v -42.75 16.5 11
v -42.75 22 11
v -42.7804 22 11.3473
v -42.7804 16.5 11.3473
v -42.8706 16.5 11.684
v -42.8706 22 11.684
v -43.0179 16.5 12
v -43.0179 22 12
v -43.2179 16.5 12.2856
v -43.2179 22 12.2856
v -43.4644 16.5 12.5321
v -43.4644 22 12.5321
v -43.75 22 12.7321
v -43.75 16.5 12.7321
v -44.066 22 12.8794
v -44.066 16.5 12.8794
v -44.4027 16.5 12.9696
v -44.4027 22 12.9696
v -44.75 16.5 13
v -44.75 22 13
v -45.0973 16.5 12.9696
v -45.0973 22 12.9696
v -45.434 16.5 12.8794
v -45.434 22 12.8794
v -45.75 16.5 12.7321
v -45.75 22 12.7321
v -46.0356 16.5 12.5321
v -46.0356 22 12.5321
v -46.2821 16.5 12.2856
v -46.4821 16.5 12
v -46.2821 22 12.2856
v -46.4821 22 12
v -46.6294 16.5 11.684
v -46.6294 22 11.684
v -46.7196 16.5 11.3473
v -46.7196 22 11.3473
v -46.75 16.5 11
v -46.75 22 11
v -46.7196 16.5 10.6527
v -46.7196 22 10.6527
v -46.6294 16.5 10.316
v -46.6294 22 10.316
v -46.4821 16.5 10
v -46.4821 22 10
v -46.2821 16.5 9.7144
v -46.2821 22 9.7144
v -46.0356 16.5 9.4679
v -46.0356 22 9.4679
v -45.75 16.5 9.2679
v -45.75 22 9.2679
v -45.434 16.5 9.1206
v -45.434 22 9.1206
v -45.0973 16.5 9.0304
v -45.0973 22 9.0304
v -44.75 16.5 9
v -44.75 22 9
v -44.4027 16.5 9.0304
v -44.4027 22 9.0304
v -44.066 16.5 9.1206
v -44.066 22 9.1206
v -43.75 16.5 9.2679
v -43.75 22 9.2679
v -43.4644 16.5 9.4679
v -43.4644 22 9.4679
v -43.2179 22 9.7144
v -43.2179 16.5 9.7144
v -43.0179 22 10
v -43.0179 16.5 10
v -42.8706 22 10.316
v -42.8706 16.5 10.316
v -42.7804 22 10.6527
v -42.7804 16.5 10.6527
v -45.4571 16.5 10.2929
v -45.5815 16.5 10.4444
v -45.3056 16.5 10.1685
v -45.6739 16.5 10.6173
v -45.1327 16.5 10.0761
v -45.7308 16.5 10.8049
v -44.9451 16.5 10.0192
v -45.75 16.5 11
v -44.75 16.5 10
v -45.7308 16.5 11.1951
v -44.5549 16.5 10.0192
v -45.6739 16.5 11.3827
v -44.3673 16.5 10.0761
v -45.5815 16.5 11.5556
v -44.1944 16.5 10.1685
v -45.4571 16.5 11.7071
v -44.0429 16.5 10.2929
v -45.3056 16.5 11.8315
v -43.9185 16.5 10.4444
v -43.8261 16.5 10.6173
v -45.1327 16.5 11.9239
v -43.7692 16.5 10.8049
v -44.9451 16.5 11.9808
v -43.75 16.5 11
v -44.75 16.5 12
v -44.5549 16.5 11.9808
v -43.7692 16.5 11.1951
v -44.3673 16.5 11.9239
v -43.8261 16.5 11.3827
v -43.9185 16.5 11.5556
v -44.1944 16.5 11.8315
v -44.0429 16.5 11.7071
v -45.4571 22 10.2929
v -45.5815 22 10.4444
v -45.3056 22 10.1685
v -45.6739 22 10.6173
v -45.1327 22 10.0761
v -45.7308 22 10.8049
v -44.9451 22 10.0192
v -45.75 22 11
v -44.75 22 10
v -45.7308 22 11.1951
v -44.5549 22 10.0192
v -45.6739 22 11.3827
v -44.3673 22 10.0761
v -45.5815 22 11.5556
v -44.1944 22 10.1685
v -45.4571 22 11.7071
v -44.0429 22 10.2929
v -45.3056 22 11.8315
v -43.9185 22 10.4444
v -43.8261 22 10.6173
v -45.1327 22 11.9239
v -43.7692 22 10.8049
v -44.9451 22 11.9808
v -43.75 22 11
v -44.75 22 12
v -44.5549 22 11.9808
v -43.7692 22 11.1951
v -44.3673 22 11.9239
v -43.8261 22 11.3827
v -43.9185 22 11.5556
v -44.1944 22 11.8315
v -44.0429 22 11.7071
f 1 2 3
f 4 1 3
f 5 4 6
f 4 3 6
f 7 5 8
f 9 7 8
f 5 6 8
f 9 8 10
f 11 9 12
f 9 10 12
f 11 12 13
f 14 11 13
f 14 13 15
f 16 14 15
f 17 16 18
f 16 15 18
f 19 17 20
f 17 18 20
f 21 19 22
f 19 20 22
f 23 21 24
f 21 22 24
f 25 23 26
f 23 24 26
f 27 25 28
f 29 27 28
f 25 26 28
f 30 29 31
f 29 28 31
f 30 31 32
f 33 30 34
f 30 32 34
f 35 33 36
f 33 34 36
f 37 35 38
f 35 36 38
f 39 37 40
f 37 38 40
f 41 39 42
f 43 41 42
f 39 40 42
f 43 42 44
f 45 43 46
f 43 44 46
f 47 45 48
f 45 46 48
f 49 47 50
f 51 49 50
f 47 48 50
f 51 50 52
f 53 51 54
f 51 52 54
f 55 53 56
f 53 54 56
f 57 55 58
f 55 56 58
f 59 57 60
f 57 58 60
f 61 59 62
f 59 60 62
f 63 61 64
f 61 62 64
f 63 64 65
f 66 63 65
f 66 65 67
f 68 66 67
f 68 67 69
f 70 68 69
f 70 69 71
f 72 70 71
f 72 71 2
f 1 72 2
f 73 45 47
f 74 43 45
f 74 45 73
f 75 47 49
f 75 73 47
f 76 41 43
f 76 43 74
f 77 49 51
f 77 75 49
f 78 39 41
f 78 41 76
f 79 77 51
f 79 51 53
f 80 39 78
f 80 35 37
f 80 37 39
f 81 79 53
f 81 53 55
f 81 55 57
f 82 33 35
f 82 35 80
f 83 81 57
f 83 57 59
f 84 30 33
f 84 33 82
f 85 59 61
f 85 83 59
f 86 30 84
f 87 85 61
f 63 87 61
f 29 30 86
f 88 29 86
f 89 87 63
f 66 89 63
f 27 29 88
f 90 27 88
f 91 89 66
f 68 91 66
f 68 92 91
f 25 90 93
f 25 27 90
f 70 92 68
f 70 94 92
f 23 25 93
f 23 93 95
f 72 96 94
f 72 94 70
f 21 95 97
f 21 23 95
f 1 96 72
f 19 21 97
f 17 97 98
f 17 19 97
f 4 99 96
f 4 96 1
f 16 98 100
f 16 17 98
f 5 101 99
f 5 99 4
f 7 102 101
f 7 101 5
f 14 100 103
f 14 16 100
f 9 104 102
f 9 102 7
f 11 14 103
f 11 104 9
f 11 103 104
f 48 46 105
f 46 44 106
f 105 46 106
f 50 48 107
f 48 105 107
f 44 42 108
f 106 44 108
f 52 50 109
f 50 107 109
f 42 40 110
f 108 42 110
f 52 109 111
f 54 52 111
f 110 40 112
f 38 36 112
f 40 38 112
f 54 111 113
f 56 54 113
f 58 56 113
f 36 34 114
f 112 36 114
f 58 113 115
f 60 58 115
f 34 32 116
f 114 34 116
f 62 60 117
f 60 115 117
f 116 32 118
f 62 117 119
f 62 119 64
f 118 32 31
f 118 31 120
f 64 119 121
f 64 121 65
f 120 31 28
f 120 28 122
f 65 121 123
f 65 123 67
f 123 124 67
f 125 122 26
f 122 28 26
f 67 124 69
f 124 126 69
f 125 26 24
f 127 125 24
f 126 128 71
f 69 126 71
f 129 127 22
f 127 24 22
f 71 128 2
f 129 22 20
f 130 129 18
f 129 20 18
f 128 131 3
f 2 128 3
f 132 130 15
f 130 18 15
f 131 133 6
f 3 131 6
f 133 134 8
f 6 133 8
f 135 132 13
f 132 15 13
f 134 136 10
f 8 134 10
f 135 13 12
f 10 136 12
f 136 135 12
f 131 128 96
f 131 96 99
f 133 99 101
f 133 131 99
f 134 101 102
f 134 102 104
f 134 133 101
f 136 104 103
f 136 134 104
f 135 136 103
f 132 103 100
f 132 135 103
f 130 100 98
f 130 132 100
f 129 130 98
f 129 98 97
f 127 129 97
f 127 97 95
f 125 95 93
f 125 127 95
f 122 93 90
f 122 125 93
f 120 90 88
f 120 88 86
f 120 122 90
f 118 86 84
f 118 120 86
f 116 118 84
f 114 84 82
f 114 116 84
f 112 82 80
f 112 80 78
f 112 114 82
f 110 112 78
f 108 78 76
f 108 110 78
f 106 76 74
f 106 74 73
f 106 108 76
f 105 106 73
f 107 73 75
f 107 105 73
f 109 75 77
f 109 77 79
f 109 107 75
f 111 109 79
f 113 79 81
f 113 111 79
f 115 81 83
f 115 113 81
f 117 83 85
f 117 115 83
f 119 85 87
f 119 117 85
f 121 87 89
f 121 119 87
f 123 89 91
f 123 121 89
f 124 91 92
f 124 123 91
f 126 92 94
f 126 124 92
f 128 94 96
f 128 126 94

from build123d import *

# Parameters (mm, degrees)
CYLINDER002_R          = 1
CYLINDER002_DEPTH      = 5.5
CYLINDER002_ROLL_ANGLE = 90
CYLINDER001_R          = 2
CYLINDER001_DEPTH      = 5.5
CYLINDER001_ROLL_ANGLE = 90


with BuildPart() as cylinder002:
    # Cylinder002 → Cylinder002 (new body)
    with BuildSketch(Plane.XY):
        Circle(CYLINDER002_R)
    extrude(amount=CYLINDER002_DEPTH)


with BuildPart() as cylinder002_1:
    # Cylinder002 roll: moved
    add(cylinder002.part.rotate(Axis((0, 0, 0), (1, 0, 0)), CYLINDER002_ROLL_ANGLE))


with BuildPart() as cylinder002_2:
    # Cylinder002 placement: moved
    add(cylinder002_1.part.moved(Location((-44.75, 22, 11))))


with BuildPart() as cut085:
    # Cylinder001 → Cylinder001 (new body)
    with BuildSketch(Plane.XY):
        Circle(CYLINDER001_R)
    extrude(amount=CYLINDER001_DEPTH)


with BuildPart() as cut085_1:
    # Cylinder001 roll: moved
    add(cut085.part.rotate(Axis((0, 0, 0), (1, 0, 0)), CYLINDER001_ROLL_ANGLE))


with BuildPart() as cut085_2:
    # Cylinder001 placement: moved
    add(cut085_1.part.moved(Location((-44.75, 22, 11))))

    # Cut085: cut Cylinder002
    add(cylinder002_2.part, mode=Mode.SUBTRACT)


solid = cut085_2.part
